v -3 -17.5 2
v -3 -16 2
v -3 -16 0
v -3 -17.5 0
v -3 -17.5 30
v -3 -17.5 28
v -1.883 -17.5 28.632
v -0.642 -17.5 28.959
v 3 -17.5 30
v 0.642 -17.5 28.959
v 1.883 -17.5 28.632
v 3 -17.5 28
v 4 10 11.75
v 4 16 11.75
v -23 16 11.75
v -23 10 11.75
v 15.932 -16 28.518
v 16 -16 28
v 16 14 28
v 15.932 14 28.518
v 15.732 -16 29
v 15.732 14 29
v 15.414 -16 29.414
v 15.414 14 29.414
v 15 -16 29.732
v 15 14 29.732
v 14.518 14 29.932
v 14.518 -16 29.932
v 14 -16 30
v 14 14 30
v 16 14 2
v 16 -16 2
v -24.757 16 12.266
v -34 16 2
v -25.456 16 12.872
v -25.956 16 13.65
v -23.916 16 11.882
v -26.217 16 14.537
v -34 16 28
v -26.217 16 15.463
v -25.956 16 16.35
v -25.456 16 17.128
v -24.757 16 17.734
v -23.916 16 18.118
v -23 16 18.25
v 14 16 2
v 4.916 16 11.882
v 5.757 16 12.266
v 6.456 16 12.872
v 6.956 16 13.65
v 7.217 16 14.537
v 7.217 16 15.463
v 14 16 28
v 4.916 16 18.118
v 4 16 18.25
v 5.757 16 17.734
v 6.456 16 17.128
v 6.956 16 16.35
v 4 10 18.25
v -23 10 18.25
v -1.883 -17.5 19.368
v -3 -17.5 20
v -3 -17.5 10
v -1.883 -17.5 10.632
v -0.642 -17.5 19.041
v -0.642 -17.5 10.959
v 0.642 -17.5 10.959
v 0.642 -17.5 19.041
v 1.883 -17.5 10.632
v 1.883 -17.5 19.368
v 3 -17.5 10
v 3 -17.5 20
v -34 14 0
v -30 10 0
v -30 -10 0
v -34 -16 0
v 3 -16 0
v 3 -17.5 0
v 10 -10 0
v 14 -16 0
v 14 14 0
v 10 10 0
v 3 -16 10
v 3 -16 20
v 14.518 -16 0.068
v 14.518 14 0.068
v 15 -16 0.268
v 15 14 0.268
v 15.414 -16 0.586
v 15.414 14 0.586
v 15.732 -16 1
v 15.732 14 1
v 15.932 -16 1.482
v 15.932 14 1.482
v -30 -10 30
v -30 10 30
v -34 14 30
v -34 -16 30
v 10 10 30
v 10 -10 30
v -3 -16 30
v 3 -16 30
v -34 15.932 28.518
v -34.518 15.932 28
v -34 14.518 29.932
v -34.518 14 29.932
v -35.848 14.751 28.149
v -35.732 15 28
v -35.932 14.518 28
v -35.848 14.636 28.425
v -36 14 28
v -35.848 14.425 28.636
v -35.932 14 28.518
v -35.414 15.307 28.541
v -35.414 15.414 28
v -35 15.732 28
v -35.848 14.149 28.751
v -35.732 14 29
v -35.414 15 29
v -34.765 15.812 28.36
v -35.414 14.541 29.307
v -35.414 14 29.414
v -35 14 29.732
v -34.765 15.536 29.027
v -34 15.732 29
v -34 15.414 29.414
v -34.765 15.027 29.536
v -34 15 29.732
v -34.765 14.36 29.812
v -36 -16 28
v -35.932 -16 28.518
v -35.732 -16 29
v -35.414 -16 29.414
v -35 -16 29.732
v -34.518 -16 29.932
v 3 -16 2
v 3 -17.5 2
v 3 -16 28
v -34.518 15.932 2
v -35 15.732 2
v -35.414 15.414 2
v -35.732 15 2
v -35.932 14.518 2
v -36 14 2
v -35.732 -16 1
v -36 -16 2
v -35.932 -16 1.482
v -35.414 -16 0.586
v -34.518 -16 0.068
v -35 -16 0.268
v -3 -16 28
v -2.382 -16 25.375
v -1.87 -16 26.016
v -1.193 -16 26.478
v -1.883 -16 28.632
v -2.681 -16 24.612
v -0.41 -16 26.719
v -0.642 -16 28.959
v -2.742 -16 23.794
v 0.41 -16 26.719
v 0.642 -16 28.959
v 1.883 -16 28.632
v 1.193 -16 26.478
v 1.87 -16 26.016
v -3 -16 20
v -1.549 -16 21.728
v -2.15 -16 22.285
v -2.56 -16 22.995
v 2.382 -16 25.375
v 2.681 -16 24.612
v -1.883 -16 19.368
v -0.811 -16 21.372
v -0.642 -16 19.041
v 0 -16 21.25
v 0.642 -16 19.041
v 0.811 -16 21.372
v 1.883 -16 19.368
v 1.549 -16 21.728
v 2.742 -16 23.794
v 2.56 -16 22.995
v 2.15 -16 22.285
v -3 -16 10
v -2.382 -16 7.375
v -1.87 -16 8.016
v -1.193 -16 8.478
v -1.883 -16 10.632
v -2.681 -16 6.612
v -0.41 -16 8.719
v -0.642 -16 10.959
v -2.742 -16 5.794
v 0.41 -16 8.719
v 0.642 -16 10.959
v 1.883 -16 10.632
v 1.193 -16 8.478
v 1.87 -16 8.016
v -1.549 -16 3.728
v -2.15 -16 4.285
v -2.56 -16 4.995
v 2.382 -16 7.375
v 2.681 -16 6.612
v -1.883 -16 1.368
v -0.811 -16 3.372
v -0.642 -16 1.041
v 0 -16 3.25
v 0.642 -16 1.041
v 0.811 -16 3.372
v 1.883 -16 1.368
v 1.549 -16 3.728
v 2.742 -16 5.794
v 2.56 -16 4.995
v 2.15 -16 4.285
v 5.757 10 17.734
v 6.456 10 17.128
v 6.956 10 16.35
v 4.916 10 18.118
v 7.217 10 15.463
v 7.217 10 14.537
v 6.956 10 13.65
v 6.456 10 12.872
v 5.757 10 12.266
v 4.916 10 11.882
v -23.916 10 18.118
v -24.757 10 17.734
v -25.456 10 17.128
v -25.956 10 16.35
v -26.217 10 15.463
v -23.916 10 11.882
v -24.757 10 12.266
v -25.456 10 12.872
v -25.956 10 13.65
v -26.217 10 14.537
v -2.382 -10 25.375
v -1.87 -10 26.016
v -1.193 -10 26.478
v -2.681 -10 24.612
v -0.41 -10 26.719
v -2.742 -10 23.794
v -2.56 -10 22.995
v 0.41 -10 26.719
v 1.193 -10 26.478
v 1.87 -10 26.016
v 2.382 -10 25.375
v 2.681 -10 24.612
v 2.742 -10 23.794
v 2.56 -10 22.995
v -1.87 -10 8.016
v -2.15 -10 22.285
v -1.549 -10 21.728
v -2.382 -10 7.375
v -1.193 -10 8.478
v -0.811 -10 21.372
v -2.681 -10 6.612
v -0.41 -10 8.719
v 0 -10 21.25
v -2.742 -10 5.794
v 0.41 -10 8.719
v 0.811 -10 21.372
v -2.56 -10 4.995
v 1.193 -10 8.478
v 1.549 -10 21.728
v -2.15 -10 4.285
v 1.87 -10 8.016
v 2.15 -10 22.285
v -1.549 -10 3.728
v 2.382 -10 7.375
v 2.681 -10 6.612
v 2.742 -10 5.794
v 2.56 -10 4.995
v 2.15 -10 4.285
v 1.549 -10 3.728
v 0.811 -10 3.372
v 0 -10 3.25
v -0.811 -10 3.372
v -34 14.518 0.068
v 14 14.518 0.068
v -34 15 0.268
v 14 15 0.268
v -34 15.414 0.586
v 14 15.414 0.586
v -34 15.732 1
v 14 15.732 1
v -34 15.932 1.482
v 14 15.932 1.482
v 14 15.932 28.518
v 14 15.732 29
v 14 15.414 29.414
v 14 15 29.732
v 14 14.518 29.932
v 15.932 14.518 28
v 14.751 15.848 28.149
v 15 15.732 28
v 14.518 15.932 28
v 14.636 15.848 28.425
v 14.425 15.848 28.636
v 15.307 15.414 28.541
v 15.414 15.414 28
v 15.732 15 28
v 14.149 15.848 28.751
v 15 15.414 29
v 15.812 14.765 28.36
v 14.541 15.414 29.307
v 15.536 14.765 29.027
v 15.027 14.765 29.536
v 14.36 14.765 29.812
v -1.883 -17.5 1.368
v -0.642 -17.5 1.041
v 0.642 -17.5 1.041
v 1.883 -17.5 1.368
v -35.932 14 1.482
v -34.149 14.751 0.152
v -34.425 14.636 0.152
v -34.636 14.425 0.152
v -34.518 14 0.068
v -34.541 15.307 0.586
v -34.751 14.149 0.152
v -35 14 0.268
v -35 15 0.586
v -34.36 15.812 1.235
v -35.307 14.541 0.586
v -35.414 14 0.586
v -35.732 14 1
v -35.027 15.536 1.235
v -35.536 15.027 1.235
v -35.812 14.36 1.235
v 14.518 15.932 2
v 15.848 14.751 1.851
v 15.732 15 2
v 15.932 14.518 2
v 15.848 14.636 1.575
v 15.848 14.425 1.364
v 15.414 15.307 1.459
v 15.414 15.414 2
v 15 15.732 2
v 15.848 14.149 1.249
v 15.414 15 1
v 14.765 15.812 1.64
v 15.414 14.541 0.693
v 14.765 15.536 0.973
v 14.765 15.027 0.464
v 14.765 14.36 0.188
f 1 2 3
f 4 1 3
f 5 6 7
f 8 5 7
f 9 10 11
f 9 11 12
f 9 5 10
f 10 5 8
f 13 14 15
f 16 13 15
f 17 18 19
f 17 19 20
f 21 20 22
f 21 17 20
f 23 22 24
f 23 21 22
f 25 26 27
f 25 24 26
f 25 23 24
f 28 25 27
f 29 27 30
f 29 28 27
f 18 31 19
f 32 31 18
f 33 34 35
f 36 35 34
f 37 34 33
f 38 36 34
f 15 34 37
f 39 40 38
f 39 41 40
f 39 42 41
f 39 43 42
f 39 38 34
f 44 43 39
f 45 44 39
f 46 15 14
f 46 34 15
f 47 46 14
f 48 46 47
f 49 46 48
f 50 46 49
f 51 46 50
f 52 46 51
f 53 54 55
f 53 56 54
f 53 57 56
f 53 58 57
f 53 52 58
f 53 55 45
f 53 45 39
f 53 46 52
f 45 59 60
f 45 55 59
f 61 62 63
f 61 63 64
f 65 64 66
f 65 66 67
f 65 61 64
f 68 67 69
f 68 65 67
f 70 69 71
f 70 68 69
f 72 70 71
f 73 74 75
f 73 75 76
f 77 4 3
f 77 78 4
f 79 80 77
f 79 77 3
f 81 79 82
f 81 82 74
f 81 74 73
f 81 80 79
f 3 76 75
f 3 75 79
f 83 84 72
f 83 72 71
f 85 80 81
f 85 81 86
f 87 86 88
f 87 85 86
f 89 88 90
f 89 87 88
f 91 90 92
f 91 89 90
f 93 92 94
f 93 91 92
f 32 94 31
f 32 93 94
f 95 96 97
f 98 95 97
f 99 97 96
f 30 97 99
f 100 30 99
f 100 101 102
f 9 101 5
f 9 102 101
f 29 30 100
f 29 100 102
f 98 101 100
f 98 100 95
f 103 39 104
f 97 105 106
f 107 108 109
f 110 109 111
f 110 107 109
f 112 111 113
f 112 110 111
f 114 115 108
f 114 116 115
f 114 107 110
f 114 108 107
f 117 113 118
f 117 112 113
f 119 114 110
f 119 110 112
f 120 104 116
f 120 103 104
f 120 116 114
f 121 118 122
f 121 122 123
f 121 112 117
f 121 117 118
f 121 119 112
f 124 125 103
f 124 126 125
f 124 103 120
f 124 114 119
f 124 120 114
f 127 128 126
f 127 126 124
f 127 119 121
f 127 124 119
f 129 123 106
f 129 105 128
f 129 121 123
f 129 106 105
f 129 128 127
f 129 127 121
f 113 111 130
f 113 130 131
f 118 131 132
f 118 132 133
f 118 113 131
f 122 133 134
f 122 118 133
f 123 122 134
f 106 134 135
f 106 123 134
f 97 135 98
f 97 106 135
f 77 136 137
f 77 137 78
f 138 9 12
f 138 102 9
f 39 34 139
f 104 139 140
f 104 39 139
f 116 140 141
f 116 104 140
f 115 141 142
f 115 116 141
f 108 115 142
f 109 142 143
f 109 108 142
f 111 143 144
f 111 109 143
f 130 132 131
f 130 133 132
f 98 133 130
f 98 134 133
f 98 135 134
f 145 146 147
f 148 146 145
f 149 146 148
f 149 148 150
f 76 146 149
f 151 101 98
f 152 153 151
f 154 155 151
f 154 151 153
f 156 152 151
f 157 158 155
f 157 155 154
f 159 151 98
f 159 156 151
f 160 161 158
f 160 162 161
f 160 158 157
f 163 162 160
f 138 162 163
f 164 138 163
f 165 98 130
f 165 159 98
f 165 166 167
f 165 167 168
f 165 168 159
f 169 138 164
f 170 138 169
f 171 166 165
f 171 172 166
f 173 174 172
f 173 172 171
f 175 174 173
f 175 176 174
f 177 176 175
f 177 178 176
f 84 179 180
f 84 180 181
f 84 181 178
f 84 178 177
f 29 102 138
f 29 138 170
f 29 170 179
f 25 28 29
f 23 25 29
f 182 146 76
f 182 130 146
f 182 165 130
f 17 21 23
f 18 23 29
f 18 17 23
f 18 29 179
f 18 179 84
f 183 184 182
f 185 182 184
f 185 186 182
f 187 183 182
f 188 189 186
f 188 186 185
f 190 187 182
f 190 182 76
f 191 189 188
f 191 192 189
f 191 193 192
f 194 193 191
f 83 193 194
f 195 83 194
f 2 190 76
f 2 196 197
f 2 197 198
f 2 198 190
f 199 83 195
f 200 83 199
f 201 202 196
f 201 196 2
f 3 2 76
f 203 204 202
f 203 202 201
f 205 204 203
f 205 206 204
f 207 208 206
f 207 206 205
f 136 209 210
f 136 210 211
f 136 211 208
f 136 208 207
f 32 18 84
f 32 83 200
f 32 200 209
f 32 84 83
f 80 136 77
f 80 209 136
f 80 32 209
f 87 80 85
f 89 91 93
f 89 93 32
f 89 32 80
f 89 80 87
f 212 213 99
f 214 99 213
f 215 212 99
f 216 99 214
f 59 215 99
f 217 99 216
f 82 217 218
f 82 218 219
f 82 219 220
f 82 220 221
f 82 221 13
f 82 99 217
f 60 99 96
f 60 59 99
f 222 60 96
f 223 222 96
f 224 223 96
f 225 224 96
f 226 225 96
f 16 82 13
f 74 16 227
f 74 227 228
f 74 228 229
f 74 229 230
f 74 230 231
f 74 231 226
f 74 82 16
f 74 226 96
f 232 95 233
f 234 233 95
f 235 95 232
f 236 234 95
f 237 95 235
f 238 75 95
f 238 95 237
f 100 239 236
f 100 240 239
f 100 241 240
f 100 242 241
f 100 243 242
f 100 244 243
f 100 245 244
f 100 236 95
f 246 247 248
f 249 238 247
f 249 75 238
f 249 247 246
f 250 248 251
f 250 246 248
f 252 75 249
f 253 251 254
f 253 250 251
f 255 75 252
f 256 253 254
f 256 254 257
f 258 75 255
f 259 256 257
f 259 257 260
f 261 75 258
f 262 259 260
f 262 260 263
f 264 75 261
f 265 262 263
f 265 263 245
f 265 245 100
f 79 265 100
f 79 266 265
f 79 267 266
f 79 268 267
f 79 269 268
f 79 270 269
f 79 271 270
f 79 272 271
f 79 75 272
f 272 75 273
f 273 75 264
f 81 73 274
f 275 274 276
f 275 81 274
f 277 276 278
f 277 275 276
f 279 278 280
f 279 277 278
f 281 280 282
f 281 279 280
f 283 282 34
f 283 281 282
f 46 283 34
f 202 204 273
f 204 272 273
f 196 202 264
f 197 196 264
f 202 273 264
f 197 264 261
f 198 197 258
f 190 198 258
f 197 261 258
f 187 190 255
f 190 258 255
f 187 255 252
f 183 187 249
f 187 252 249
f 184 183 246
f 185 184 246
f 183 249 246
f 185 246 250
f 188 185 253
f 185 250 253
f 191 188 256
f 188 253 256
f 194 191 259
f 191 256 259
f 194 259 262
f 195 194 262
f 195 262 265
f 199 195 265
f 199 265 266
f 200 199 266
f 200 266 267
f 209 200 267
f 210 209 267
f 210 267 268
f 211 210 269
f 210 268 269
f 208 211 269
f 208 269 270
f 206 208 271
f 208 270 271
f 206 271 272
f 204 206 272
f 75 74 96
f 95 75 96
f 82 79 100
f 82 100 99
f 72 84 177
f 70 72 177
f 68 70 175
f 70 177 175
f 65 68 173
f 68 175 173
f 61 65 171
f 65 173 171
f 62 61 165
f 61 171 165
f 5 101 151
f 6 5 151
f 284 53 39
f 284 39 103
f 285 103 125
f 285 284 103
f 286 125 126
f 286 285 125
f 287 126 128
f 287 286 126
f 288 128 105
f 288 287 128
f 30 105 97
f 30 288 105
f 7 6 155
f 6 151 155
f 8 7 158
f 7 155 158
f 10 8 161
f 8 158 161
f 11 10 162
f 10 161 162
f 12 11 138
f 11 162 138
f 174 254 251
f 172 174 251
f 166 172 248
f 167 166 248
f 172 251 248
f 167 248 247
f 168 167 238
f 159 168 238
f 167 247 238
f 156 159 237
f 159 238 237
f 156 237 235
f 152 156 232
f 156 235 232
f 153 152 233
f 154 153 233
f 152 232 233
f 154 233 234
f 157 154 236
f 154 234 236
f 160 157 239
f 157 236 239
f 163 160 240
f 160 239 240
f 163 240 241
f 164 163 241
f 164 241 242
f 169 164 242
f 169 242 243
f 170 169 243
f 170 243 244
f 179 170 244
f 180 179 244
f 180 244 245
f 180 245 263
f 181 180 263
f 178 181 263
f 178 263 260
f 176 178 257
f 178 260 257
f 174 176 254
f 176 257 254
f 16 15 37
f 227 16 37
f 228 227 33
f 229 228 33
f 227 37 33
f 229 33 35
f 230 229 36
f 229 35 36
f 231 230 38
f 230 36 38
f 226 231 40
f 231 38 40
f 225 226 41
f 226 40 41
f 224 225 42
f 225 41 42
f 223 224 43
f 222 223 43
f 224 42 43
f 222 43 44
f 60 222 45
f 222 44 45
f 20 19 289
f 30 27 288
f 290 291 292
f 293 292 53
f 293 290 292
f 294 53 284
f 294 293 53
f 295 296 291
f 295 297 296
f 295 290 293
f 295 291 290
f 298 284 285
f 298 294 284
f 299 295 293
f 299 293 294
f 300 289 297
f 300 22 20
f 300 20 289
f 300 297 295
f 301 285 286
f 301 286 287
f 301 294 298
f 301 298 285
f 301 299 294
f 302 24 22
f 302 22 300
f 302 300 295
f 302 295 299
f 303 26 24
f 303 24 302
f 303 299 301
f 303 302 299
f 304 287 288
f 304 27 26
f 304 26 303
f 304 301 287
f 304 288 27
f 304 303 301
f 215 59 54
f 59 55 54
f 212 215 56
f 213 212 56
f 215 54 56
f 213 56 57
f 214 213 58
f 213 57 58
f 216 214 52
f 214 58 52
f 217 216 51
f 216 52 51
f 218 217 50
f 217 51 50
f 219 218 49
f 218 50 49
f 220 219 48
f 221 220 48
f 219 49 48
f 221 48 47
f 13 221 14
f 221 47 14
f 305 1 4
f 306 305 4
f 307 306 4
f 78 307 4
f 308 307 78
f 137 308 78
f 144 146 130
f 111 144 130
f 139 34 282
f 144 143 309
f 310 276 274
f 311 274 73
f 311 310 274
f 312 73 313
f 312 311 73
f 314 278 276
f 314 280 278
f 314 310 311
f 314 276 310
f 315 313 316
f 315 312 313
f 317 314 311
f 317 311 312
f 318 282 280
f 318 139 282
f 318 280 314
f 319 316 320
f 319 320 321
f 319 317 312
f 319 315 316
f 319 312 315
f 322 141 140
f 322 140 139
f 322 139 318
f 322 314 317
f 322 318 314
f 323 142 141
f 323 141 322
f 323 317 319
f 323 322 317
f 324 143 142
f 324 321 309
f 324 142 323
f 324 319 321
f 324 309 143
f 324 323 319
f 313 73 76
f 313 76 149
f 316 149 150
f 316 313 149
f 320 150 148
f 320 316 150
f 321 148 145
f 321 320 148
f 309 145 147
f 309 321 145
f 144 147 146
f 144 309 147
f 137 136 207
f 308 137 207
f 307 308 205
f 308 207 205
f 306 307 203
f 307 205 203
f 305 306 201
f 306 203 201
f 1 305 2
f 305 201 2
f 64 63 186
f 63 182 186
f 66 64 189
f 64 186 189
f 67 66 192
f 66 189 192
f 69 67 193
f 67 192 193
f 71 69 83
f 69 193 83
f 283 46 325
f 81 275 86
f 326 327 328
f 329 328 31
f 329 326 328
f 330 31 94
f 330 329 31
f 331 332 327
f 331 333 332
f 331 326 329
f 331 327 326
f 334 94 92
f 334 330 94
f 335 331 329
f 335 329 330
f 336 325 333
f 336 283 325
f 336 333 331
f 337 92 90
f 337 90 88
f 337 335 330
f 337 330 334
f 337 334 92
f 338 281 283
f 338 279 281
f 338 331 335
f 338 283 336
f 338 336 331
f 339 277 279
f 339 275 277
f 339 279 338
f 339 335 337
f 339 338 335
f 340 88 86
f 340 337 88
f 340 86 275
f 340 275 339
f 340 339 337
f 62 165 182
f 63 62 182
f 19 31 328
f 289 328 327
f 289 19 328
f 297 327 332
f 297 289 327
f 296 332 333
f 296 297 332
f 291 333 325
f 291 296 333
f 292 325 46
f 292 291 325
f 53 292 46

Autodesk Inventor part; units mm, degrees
ref_plane "YZ Plane" through (0, 0, 0) normal (1, 0, 0) x (0, 1, 0)
ref_plane "XZ Plane" through (0, 0, 0) normal (0, 1, 0) x (-1, 0, 0)
ref_plane "XY Plane" through (0, 0, 0) normal (0, 0, 1) x (1, 0, 0)
sketch "Sketch1" plane through (0, 0, 0) normal (0, 0, 1) x (1, 0, 0)
  line L0 (-12.2491, 0) -> (12.2491, 0)
  line L1 (0, 10.917) -> (0, -10.917)
  line L2 (-30, -10) -> (-30, -16)
  line L3 (-30, -16) -> (16, -16)
  line L4 (-30, -10) -> (10, -10)
  line L5 (10, -10) -> (10, 10)
  line L6 (10, 10) -> (-30, 10)
  line L7 (-30, 10) -> (-30, 16)
  line L8 (-30, 16) -> (16, 16)
  line L9 (16, 16) -> (16, -16)
  point P0 (0, 0)
  point P1 (0, 0)
  dimension "d0" = 10
  dimension "d1" = 10
  dimension "d2" = 10
  dimension "d3" = 30
  dimension "d4" = 6
  dimension "d5" = 6
  dimension "d6" = 40
  dimension "d7" = 6
extrude "Extrusion1" add sketch "Sketch1" along normal blind 30 contours L5 L6 L7 L8 L9 L3 L2 L4
sketch "Sketch2" plane through (-30, -16, 0) normal (0, -1, 0) x (1, 0, 0)
  line L0 (40, 30) -> (0, 30) projected
  line L1 (27, 30) -> (27, 0)
  line L2 (0, 0) -> (0, 30) projected
  line L3 (33, 30) -> (33, 0)
  line L4 (40, 0) -> (0, 0) projected
  line L5 (27, 30) -> (33, 30)
  line L6 (33, 0) -> (27, 0)
  line L7 (46, 0) -> (46, 30) projected
  line L8 (40, 0) -> (40, 30) projected
  point P0 (30, 0)
  dimension "d37" = 13
  dimension "d38" = 7
extrude "Extrusion2" add sketch "Sketch2" along normal blind 1.5 contours L3 L4 L1 L0
sketch "Sketch3" plane through (-30, -17.5, 0) normal (0, -1, 0) x (1, 0, 0)
  line L0 (27, 0) -> (33, 0) projected
  line L1 (27, 30) -> (27, 0) projected
  line L2 (27, 15) -> (13, 15)
  line L3 (33, 0) -> (33, 30) projected
  point P0 (30, 0)
  point P1 (30, 6)
  point P2 (30, 24)
  dimension "d14" = 6
  dimension "d36" = 3
hole "Hole1" at (0, -17.5, 6) at (0, -17.5, 24) direction (0, 1, 0) diameter 5.5 end up to surface counterbore diameter 10 counterbore depth 1.5
sketch "Sketch4" plane through (-30, 16, 0) normal (0, 1, 0) x (1, 0, 0)
  arc A0 (7, -11.75) -> (7, -18.25) centre (7, -15) ccw
  line L0 (0, 0) -> (0, -30) projected
  line L1 (46, 0) -> (0, 0) projected
  arc A1 (34, -18.25) -> (34, -11.75) centre (34, -15) ccw
  line L2 (46, -30) -> (0, -30) projected
  line L3 (34, -11.75) -> (7, -11.75)
  line L4 (34, -18.25) -> (7, -18.25)
  point P0 (30, 0)
  dimension "d22" = 6.5
  dimension "d23" = 7
  dimension "d24" = 15
  dimension "d25" = 6.5
  dimension "d26" = 34
  dimension "d27" = 15
extrude "Extrusion3" cut sketch "Sketch4" against normal up to surface (6 mm away)
sketch "Sketch5" plane through (-30, -16, 0) normal (-1, 0, 0) x (0, 0, 1)
  line L0 (0, 0) -> (0, 32) projected
  line L1 (30, 6) -> (30, 0) projected
  line L2 (0, 32) -> (30, 32)
  line L3 (30, 32) -> (30, 0)
  line L4 (30, 0) -> (0, 0)
  line L5 (0, 0) -> (0, 32)
  point P0 (0, 16)
extrude "Extrusion4" add sketch "Sketch5" along normal blind 6
fillet "Fillet3" radius 2 8 edges at (16, 0, 30) (-10, 16, 30) (-36, 16, 15) (-36, 0, 30) (-36, 0, 0) (-10, 16, 0) (16, 16, 15) (16, 0, 0)
properties part number "Estrutura - Suporte Mesa"
